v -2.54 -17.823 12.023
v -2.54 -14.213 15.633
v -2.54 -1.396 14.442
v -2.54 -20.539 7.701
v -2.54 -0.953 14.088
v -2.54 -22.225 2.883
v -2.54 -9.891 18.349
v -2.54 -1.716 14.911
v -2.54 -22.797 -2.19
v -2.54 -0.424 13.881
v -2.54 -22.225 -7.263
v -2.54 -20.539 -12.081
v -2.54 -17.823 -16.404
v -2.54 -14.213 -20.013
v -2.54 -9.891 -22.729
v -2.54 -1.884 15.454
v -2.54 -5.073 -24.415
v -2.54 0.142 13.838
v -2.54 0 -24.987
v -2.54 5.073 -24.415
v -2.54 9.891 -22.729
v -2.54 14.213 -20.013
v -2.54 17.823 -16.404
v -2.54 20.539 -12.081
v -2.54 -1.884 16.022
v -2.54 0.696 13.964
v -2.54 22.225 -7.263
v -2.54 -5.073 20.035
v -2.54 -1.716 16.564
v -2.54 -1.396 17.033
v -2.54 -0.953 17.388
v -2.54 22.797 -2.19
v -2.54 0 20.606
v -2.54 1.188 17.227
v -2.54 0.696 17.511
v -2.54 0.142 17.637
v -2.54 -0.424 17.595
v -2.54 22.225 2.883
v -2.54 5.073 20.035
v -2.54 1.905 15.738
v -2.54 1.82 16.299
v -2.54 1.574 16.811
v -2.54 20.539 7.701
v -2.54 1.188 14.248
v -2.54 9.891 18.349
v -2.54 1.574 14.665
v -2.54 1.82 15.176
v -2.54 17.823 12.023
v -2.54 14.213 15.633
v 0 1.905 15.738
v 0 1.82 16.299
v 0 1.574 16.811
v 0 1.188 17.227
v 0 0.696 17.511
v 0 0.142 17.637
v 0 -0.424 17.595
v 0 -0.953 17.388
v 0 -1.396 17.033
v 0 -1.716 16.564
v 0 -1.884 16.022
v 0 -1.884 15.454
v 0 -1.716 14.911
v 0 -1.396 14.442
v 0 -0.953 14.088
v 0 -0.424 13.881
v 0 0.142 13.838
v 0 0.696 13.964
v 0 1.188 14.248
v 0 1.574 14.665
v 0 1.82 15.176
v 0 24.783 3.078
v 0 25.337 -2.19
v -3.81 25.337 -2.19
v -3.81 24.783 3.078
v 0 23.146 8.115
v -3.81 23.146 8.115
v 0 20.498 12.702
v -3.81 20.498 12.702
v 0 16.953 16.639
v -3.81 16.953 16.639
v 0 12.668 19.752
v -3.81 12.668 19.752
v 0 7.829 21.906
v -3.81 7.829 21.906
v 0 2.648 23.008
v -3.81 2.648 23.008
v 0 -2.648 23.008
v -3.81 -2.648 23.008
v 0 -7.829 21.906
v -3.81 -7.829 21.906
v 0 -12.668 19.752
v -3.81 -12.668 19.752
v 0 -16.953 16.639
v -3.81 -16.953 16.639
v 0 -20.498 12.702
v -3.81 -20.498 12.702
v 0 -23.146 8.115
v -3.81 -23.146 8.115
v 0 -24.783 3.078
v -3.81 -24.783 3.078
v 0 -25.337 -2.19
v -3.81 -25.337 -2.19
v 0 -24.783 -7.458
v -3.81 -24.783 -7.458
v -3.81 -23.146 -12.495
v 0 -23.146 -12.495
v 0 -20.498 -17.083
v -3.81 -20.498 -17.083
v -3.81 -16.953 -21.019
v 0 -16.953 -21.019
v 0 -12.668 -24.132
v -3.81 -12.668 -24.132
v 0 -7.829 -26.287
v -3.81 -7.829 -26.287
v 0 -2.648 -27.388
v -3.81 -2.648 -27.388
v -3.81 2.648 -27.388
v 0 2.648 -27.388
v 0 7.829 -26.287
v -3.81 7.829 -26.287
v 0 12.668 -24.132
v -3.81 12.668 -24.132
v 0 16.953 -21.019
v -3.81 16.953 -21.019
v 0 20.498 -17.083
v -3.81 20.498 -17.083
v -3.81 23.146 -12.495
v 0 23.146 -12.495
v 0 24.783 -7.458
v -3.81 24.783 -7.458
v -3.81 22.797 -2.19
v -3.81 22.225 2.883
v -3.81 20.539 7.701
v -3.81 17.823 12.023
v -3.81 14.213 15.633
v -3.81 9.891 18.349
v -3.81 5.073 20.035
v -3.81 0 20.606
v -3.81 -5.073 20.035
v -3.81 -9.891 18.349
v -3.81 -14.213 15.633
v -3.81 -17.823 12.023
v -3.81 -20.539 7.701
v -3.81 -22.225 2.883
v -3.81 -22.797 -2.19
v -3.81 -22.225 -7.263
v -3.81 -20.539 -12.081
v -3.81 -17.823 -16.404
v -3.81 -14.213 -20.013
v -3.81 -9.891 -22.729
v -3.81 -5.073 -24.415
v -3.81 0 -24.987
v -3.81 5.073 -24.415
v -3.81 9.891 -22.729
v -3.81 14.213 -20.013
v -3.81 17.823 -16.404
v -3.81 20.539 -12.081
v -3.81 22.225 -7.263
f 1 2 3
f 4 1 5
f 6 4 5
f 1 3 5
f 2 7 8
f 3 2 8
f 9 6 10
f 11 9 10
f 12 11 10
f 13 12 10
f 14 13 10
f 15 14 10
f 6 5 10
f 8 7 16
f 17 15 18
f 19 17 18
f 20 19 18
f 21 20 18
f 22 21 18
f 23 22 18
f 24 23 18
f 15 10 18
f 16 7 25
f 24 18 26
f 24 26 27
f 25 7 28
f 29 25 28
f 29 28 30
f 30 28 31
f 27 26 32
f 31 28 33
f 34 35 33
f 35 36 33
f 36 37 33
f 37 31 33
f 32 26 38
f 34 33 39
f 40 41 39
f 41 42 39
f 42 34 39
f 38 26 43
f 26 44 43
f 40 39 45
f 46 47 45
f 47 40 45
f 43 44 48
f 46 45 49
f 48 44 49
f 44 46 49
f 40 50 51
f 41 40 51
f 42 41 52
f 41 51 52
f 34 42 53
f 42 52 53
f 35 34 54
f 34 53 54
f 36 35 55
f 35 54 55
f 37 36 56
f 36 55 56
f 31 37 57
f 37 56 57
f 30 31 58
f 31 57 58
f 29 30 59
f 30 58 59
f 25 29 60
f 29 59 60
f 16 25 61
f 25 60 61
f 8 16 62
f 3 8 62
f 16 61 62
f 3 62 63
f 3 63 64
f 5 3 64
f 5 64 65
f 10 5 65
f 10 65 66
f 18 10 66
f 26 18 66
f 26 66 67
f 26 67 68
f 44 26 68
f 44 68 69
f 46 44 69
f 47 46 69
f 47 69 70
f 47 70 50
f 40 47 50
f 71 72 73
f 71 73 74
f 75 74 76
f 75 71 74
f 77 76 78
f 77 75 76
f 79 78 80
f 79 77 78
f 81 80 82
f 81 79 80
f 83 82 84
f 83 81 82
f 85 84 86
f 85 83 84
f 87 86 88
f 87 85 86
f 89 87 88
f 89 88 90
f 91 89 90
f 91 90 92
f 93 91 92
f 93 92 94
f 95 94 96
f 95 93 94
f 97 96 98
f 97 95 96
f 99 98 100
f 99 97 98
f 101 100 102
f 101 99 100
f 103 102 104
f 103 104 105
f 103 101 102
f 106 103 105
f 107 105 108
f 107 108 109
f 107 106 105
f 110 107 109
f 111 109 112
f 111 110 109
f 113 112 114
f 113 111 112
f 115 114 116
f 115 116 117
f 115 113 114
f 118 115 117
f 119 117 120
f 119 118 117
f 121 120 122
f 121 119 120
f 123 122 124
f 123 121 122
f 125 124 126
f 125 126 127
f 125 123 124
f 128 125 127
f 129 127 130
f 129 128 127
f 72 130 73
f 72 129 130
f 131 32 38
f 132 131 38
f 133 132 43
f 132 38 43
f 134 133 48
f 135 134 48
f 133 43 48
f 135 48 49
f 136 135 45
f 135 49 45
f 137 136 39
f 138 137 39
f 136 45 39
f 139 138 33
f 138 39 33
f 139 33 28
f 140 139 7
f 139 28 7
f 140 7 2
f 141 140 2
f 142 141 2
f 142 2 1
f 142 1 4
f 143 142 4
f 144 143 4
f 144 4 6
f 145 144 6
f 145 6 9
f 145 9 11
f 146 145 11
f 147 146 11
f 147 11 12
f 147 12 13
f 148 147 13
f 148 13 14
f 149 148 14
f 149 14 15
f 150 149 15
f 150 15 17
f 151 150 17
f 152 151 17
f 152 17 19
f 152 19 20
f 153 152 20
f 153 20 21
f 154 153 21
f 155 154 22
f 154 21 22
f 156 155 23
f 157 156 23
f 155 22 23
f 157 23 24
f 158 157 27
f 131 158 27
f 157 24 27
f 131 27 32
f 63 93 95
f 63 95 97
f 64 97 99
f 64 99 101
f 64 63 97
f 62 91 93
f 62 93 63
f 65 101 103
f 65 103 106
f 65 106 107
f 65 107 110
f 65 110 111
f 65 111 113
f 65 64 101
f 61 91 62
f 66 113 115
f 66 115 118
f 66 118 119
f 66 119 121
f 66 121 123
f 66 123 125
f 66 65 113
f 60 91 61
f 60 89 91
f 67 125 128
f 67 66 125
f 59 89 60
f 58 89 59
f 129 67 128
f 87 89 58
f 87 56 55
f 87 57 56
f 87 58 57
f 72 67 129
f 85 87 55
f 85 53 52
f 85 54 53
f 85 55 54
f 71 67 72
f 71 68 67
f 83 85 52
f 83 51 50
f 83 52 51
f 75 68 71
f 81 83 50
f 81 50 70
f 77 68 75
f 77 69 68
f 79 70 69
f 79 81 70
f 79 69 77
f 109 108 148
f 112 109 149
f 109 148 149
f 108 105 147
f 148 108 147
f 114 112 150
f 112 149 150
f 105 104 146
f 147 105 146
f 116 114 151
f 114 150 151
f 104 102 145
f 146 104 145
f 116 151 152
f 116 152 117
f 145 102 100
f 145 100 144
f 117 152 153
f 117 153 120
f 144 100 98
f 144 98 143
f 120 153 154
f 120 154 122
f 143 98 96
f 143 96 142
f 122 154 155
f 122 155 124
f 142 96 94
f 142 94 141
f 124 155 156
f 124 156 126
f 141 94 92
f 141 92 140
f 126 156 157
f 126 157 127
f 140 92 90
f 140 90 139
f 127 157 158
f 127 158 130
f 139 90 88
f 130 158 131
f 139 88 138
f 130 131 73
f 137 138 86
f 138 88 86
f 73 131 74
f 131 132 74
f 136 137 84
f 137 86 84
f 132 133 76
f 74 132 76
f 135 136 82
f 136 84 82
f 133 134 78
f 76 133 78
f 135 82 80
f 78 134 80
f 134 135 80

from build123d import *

# Parameters (mm, degrees)
F0_R     = 25.336511
F1_DEPTH = 3.81
F2_T     = -2.54
F4_D     = 3.81
F4_DEPTH = 2.54


with BuildPart() as f1:
    # F0 (on Right) → F1 (new body)
    with BuildSketch(Plane.YZ):
        with Locations((0, -2.190114)):
            Circle(F0_R)
    extrude(amount=-F1_DEPTH)

    # F2
    f2_openings = [f1.faces().sort_by_distance(p)[0] for p in [
        (-3.81, 0, -2.190114),
    ]]
    offset(amount=F2_T, openings=f2_openings)

    # F4
    with Locations(Plane(origin=(-2.54, 0, 0), x_dir=(0, -1, 0), z_dir=(-1, 0, 0))):
        with Locations((0, 15.737751)):
            Hole(F4_D / 2, depth=F4_DEPTH)


solid = f1.part
